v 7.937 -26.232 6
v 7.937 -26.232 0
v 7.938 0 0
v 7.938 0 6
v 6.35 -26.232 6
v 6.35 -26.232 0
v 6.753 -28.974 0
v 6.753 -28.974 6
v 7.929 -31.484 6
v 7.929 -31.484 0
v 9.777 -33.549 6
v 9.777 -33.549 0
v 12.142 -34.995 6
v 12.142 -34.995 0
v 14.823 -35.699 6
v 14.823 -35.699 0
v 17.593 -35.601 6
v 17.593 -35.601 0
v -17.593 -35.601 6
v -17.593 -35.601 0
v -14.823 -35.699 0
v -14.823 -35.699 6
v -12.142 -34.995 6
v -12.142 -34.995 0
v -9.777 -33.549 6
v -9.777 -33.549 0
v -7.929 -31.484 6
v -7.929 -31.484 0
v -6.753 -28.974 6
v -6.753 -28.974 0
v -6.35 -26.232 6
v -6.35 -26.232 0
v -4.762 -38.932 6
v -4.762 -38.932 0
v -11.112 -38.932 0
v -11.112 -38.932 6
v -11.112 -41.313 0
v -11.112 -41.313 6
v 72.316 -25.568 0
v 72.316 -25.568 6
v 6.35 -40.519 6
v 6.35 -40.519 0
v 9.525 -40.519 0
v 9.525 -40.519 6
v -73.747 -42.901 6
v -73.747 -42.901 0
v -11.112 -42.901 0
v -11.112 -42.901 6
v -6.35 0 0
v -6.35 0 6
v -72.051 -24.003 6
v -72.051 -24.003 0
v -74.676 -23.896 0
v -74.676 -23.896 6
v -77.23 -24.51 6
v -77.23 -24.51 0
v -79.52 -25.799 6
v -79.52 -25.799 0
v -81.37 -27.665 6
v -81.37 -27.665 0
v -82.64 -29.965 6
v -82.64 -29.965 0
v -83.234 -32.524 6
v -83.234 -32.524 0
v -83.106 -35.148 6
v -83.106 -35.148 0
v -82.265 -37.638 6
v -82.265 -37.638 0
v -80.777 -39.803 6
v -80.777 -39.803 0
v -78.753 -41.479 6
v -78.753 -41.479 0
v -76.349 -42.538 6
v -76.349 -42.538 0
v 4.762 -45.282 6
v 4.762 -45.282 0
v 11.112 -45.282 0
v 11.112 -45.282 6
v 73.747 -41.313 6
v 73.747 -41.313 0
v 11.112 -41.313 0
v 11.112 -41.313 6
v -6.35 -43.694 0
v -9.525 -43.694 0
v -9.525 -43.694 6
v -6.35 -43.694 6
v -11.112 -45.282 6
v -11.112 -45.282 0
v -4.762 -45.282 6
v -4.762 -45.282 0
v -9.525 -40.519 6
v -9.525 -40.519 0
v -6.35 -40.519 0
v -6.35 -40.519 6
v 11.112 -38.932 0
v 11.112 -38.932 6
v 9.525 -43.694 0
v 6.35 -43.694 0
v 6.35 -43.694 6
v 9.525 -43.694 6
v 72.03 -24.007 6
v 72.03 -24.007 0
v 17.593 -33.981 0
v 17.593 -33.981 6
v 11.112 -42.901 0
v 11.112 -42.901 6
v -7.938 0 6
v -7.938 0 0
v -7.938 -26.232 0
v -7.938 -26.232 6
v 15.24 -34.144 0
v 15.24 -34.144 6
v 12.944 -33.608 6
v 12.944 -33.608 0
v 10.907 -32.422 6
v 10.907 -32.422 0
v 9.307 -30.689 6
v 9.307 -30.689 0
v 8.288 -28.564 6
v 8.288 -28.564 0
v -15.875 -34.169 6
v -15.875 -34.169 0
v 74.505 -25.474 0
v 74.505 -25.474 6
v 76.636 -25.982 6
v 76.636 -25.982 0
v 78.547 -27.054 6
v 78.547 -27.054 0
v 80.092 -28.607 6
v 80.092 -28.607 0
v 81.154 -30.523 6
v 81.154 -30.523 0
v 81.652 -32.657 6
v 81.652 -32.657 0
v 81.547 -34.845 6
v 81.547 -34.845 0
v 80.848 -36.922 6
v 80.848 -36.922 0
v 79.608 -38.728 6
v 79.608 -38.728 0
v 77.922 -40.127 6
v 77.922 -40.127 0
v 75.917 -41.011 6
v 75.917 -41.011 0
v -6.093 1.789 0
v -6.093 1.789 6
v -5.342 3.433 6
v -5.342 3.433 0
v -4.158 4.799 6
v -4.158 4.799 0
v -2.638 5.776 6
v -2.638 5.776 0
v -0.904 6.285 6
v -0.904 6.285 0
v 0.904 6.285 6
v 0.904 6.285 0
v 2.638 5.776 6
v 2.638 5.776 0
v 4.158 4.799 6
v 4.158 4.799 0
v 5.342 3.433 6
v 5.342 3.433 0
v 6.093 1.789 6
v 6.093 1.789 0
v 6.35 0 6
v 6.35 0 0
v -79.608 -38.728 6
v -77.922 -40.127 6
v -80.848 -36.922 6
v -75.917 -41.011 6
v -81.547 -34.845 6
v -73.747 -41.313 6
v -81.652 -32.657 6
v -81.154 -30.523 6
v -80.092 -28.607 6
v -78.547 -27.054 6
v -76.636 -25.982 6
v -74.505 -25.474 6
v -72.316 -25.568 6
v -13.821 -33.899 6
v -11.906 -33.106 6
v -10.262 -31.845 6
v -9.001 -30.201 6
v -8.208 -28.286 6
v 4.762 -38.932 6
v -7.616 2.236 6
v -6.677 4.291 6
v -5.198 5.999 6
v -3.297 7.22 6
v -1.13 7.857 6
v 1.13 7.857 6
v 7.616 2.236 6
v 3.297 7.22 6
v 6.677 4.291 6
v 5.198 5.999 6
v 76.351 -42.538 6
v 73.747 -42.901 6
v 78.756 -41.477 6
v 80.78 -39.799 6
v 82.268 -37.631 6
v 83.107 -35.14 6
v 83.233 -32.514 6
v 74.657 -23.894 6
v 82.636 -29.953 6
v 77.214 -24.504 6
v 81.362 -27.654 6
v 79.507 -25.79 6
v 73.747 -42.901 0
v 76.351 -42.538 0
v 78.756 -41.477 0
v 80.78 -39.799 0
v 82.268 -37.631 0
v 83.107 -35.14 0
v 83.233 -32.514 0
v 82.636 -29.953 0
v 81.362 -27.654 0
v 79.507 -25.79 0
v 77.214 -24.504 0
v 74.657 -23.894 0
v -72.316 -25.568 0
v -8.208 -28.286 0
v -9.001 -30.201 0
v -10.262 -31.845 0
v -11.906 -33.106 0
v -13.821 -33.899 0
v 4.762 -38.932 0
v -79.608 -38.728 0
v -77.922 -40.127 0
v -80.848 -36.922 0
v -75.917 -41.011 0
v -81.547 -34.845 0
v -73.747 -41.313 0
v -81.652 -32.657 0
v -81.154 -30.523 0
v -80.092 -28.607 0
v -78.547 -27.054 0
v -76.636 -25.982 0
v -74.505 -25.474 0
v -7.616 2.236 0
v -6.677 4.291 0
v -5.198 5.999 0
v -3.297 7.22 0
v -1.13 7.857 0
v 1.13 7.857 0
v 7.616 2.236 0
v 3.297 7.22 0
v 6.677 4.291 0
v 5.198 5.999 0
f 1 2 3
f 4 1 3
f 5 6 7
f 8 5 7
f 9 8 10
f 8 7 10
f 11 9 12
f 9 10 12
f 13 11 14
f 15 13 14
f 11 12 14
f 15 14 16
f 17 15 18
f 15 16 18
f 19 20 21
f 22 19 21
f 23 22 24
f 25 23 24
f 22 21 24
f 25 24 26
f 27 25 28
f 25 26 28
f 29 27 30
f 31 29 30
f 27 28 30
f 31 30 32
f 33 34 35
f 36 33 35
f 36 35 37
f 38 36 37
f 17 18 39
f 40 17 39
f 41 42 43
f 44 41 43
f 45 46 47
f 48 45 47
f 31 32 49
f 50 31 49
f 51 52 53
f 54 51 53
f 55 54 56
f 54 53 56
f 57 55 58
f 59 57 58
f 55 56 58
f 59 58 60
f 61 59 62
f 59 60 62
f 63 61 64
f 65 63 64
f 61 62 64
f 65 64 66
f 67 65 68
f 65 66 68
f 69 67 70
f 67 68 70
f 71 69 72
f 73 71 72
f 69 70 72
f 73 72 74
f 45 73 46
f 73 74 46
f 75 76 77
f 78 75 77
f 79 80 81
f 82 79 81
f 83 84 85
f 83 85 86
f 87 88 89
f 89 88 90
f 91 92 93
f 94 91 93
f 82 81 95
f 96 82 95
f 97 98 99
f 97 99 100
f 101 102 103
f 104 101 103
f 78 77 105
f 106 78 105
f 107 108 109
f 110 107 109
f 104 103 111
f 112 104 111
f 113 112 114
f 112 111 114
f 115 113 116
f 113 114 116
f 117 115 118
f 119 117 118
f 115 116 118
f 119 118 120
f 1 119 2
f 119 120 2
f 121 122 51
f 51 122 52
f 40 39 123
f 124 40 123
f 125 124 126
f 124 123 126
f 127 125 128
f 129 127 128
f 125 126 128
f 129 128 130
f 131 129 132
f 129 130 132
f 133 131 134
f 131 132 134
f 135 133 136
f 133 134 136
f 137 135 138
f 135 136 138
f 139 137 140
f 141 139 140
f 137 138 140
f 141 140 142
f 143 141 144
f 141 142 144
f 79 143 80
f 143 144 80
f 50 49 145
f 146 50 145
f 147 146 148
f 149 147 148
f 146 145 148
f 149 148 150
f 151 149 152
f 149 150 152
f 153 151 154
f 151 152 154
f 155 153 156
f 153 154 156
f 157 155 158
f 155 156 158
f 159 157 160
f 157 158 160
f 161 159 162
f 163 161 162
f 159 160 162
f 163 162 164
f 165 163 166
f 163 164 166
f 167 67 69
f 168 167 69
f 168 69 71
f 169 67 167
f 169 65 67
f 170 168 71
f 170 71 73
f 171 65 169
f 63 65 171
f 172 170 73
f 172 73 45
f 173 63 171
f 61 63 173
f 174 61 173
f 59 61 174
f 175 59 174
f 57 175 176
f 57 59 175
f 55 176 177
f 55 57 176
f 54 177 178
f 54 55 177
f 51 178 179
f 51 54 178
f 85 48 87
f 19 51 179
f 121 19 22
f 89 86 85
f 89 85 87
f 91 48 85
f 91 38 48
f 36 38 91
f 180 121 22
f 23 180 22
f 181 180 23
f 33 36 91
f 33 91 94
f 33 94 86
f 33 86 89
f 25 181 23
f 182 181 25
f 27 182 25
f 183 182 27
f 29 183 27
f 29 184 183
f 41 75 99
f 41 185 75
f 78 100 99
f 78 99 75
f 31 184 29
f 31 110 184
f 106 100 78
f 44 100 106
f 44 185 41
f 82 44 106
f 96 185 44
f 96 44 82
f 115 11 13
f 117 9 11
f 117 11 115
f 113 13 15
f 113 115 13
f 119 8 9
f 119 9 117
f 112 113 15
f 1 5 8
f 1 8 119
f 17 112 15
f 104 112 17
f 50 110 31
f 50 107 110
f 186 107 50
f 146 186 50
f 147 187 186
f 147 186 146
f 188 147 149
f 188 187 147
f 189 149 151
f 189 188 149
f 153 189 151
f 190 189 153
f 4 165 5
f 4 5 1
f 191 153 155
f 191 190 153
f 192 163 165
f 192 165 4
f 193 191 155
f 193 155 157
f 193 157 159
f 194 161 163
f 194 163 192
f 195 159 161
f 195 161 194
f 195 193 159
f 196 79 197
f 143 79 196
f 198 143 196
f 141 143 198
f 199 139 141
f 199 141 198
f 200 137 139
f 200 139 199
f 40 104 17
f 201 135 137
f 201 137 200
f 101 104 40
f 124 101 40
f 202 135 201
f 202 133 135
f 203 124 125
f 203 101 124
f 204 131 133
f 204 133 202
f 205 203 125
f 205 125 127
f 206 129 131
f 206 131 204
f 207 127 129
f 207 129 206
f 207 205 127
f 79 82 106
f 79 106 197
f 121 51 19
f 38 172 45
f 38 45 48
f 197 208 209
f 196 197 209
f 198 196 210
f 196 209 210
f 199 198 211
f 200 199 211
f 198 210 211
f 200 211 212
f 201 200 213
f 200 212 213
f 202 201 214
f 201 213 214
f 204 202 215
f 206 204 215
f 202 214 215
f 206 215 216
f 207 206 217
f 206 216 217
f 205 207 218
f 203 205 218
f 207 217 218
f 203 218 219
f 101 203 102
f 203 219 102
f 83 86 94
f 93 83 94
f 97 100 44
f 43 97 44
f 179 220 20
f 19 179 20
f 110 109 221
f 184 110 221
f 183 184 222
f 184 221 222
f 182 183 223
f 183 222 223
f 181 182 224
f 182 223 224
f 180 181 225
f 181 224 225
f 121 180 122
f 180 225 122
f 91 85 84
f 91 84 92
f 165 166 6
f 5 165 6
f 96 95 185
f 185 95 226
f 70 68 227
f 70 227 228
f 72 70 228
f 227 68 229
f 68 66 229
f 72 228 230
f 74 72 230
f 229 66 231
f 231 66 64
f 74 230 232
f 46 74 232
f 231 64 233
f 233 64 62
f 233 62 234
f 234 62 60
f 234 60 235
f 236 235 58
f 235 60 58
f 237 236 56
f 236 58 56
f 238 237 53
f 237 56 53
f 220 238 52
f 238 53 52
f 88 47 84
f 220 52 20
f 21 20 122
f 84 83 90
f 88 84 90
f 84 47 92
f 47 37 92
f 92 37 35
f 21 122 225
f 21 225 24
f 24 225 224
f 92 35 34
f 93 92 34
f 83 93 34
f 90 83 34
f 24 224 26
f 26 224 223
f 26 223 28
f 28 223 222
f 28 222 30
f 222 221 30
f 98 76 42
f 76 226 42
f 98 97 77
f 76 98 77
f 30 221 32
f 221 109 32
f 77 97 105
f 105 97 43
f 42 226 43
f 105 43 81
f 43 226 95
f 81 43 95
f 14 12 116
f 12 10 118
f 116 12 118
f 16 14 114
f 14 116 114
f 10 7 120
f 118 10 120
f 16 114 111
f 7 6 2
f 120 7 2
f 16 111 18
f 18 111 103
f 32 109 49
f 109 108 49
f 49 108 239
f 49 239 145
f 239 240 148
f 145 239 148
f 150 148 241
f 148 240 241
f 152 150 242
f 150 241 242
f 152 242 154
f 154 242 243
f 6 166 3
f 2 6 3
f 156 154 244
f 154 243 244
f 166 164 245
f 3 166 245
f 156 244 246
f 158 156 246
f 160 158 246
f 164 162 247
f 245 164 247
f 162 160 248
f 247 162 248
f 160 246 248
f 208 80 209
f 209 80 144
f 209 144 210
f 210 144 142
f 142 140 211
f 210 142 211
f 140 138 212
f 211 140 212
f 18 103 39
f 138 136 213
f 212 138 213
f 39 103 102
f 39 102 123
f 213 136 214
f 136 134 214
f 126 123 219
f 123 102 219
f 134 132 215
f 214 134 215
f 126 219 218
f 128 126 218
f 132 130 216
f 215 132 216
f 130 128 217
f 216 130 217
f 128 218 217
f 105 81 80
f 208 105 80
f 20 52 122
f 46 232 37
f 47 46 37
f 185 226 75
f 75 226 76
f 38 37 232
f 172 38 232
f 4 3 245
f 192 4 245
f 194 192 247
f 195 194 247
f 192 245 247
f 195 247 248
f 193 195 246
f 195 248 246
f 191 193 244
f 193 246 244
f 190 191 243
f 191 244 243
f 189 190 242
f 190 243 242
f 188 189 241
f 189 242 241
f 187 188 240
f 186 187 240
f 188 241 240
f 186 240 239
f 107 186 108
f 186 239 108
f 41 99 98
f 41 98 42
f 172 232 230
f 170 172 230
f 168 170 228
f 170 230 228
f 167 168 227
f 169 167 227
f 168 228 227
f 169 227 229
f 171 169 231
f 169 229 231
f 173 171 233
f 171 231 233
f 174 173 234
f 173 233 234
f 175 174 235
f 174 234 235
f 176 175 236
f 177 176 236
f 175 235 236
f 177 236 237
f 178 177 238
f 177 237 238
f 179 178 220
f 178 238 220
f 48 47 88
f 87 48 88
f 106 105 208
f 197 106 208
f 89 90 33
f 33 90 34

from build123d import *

# Parameters (mm, degrees)
F0_W     = 3.175
F0_H     = 3.175
F1_DEPTH = 6


with BuildPart() as f1:
    # F0 (on Top) → F1 (new body)
    with BuildSketch(Plane.XY):
        with BuildLine():
            Line((-6.35, -26.23185), (-6.35, 0))
            ThreePointArc((-6.35, 0), (0, 6.35), (6.35, 0))
            Line((6.35, 0), (6.35, -26.23185))
            ThreePointArc((6.35, -26.23185), (9.777239, -33.549154), (17.59261, -35.600705))
            Line((17.59261, -35.600705), (72.315666, -25.568221))
            ThreePointArc((72.315666, -25.568221), (81.651911, -32.656978), (73.747008, -41.3131))
            Line((73.747008, -41.3131), (11.1125, -41.3131))
            Line((11.1125, -41.3131), (11.1125, -42.9006))
            Line((11.1125, -42.9006), (73.747008, -42.9006))
            ThreePointArc((73.747008, -42.9006), (83.232933, -32.513714), (72.030307, -24.006578))
            Line((72.030307, -24.006578), (17.59261, -33.981284))
            ThreePointArc((17.59261, -33.981284), (10.906581, -32.422062), (7.9375, -26.23185))
            Line((7.9375, -26.23185), (7.9375, 0))
            ThreePointArc((7.9375, 0), (0, 7.9375), (-7.9375, 0))
            Line((-7.9375, 0), (-7.9375, -26.23185))
            ThreePointArc((-7.9375, -26.23185), (-10.26234, -31.84451), (-15.875, -34.16935))
            Line((-15.875, -34.16935), (-72.05076, -24.002854))
            ThreePointArc((-72.05076, -24.002854), (-83.233868, -32.524067), (-73.747008, -42.9006))
            Line((-73.747008, -42.9006), (-11.1125, -42.9006))
            Line((-11.1125, -42.9006), (-11.1125, -41.3131))
            Line((-11.1125, -41.3131), (-73.747008, -41.3131))
            ThreePointArc((-73.747008, -41.3131), (-81.651911, -32.656978), (-72.315666, -25.568221))
            Line((-72.315666, -25.568221), (-17.59261, -35.600705))
            ThreePointArc((-17.59261, -35.600705), (-9.777239, -33.549154), (-6.35, -26.23185))
        make_face()
        Polygon((-11.1125, -38.93185), (-11.1125, -41.3131), (-11.1125, -42.9006), (-11.1125, -45.28185), (-4.7625, -45.28185), (-4.7625, -38.93185), align=None)
        with Locations((-7.9375, -42.10685)):
            Rectangle(F0_W, F0_H, mode=Mode.SUBTRACT)
        Polygon((11.1125, -42.9006), (11.1125, -41.3131), (11.1125, -38.93185), (4.7625, -38.93185), (4.7625, -45.28185), (11.1125, -45.28185), align=None)
        with Locations((7.9375, -42.10685)):
            Rectangle(F0_W, F0_H, mode=Mode.SUBTRACT)
    extrude(amount=F1_DEPTH)


solid = f1.part
